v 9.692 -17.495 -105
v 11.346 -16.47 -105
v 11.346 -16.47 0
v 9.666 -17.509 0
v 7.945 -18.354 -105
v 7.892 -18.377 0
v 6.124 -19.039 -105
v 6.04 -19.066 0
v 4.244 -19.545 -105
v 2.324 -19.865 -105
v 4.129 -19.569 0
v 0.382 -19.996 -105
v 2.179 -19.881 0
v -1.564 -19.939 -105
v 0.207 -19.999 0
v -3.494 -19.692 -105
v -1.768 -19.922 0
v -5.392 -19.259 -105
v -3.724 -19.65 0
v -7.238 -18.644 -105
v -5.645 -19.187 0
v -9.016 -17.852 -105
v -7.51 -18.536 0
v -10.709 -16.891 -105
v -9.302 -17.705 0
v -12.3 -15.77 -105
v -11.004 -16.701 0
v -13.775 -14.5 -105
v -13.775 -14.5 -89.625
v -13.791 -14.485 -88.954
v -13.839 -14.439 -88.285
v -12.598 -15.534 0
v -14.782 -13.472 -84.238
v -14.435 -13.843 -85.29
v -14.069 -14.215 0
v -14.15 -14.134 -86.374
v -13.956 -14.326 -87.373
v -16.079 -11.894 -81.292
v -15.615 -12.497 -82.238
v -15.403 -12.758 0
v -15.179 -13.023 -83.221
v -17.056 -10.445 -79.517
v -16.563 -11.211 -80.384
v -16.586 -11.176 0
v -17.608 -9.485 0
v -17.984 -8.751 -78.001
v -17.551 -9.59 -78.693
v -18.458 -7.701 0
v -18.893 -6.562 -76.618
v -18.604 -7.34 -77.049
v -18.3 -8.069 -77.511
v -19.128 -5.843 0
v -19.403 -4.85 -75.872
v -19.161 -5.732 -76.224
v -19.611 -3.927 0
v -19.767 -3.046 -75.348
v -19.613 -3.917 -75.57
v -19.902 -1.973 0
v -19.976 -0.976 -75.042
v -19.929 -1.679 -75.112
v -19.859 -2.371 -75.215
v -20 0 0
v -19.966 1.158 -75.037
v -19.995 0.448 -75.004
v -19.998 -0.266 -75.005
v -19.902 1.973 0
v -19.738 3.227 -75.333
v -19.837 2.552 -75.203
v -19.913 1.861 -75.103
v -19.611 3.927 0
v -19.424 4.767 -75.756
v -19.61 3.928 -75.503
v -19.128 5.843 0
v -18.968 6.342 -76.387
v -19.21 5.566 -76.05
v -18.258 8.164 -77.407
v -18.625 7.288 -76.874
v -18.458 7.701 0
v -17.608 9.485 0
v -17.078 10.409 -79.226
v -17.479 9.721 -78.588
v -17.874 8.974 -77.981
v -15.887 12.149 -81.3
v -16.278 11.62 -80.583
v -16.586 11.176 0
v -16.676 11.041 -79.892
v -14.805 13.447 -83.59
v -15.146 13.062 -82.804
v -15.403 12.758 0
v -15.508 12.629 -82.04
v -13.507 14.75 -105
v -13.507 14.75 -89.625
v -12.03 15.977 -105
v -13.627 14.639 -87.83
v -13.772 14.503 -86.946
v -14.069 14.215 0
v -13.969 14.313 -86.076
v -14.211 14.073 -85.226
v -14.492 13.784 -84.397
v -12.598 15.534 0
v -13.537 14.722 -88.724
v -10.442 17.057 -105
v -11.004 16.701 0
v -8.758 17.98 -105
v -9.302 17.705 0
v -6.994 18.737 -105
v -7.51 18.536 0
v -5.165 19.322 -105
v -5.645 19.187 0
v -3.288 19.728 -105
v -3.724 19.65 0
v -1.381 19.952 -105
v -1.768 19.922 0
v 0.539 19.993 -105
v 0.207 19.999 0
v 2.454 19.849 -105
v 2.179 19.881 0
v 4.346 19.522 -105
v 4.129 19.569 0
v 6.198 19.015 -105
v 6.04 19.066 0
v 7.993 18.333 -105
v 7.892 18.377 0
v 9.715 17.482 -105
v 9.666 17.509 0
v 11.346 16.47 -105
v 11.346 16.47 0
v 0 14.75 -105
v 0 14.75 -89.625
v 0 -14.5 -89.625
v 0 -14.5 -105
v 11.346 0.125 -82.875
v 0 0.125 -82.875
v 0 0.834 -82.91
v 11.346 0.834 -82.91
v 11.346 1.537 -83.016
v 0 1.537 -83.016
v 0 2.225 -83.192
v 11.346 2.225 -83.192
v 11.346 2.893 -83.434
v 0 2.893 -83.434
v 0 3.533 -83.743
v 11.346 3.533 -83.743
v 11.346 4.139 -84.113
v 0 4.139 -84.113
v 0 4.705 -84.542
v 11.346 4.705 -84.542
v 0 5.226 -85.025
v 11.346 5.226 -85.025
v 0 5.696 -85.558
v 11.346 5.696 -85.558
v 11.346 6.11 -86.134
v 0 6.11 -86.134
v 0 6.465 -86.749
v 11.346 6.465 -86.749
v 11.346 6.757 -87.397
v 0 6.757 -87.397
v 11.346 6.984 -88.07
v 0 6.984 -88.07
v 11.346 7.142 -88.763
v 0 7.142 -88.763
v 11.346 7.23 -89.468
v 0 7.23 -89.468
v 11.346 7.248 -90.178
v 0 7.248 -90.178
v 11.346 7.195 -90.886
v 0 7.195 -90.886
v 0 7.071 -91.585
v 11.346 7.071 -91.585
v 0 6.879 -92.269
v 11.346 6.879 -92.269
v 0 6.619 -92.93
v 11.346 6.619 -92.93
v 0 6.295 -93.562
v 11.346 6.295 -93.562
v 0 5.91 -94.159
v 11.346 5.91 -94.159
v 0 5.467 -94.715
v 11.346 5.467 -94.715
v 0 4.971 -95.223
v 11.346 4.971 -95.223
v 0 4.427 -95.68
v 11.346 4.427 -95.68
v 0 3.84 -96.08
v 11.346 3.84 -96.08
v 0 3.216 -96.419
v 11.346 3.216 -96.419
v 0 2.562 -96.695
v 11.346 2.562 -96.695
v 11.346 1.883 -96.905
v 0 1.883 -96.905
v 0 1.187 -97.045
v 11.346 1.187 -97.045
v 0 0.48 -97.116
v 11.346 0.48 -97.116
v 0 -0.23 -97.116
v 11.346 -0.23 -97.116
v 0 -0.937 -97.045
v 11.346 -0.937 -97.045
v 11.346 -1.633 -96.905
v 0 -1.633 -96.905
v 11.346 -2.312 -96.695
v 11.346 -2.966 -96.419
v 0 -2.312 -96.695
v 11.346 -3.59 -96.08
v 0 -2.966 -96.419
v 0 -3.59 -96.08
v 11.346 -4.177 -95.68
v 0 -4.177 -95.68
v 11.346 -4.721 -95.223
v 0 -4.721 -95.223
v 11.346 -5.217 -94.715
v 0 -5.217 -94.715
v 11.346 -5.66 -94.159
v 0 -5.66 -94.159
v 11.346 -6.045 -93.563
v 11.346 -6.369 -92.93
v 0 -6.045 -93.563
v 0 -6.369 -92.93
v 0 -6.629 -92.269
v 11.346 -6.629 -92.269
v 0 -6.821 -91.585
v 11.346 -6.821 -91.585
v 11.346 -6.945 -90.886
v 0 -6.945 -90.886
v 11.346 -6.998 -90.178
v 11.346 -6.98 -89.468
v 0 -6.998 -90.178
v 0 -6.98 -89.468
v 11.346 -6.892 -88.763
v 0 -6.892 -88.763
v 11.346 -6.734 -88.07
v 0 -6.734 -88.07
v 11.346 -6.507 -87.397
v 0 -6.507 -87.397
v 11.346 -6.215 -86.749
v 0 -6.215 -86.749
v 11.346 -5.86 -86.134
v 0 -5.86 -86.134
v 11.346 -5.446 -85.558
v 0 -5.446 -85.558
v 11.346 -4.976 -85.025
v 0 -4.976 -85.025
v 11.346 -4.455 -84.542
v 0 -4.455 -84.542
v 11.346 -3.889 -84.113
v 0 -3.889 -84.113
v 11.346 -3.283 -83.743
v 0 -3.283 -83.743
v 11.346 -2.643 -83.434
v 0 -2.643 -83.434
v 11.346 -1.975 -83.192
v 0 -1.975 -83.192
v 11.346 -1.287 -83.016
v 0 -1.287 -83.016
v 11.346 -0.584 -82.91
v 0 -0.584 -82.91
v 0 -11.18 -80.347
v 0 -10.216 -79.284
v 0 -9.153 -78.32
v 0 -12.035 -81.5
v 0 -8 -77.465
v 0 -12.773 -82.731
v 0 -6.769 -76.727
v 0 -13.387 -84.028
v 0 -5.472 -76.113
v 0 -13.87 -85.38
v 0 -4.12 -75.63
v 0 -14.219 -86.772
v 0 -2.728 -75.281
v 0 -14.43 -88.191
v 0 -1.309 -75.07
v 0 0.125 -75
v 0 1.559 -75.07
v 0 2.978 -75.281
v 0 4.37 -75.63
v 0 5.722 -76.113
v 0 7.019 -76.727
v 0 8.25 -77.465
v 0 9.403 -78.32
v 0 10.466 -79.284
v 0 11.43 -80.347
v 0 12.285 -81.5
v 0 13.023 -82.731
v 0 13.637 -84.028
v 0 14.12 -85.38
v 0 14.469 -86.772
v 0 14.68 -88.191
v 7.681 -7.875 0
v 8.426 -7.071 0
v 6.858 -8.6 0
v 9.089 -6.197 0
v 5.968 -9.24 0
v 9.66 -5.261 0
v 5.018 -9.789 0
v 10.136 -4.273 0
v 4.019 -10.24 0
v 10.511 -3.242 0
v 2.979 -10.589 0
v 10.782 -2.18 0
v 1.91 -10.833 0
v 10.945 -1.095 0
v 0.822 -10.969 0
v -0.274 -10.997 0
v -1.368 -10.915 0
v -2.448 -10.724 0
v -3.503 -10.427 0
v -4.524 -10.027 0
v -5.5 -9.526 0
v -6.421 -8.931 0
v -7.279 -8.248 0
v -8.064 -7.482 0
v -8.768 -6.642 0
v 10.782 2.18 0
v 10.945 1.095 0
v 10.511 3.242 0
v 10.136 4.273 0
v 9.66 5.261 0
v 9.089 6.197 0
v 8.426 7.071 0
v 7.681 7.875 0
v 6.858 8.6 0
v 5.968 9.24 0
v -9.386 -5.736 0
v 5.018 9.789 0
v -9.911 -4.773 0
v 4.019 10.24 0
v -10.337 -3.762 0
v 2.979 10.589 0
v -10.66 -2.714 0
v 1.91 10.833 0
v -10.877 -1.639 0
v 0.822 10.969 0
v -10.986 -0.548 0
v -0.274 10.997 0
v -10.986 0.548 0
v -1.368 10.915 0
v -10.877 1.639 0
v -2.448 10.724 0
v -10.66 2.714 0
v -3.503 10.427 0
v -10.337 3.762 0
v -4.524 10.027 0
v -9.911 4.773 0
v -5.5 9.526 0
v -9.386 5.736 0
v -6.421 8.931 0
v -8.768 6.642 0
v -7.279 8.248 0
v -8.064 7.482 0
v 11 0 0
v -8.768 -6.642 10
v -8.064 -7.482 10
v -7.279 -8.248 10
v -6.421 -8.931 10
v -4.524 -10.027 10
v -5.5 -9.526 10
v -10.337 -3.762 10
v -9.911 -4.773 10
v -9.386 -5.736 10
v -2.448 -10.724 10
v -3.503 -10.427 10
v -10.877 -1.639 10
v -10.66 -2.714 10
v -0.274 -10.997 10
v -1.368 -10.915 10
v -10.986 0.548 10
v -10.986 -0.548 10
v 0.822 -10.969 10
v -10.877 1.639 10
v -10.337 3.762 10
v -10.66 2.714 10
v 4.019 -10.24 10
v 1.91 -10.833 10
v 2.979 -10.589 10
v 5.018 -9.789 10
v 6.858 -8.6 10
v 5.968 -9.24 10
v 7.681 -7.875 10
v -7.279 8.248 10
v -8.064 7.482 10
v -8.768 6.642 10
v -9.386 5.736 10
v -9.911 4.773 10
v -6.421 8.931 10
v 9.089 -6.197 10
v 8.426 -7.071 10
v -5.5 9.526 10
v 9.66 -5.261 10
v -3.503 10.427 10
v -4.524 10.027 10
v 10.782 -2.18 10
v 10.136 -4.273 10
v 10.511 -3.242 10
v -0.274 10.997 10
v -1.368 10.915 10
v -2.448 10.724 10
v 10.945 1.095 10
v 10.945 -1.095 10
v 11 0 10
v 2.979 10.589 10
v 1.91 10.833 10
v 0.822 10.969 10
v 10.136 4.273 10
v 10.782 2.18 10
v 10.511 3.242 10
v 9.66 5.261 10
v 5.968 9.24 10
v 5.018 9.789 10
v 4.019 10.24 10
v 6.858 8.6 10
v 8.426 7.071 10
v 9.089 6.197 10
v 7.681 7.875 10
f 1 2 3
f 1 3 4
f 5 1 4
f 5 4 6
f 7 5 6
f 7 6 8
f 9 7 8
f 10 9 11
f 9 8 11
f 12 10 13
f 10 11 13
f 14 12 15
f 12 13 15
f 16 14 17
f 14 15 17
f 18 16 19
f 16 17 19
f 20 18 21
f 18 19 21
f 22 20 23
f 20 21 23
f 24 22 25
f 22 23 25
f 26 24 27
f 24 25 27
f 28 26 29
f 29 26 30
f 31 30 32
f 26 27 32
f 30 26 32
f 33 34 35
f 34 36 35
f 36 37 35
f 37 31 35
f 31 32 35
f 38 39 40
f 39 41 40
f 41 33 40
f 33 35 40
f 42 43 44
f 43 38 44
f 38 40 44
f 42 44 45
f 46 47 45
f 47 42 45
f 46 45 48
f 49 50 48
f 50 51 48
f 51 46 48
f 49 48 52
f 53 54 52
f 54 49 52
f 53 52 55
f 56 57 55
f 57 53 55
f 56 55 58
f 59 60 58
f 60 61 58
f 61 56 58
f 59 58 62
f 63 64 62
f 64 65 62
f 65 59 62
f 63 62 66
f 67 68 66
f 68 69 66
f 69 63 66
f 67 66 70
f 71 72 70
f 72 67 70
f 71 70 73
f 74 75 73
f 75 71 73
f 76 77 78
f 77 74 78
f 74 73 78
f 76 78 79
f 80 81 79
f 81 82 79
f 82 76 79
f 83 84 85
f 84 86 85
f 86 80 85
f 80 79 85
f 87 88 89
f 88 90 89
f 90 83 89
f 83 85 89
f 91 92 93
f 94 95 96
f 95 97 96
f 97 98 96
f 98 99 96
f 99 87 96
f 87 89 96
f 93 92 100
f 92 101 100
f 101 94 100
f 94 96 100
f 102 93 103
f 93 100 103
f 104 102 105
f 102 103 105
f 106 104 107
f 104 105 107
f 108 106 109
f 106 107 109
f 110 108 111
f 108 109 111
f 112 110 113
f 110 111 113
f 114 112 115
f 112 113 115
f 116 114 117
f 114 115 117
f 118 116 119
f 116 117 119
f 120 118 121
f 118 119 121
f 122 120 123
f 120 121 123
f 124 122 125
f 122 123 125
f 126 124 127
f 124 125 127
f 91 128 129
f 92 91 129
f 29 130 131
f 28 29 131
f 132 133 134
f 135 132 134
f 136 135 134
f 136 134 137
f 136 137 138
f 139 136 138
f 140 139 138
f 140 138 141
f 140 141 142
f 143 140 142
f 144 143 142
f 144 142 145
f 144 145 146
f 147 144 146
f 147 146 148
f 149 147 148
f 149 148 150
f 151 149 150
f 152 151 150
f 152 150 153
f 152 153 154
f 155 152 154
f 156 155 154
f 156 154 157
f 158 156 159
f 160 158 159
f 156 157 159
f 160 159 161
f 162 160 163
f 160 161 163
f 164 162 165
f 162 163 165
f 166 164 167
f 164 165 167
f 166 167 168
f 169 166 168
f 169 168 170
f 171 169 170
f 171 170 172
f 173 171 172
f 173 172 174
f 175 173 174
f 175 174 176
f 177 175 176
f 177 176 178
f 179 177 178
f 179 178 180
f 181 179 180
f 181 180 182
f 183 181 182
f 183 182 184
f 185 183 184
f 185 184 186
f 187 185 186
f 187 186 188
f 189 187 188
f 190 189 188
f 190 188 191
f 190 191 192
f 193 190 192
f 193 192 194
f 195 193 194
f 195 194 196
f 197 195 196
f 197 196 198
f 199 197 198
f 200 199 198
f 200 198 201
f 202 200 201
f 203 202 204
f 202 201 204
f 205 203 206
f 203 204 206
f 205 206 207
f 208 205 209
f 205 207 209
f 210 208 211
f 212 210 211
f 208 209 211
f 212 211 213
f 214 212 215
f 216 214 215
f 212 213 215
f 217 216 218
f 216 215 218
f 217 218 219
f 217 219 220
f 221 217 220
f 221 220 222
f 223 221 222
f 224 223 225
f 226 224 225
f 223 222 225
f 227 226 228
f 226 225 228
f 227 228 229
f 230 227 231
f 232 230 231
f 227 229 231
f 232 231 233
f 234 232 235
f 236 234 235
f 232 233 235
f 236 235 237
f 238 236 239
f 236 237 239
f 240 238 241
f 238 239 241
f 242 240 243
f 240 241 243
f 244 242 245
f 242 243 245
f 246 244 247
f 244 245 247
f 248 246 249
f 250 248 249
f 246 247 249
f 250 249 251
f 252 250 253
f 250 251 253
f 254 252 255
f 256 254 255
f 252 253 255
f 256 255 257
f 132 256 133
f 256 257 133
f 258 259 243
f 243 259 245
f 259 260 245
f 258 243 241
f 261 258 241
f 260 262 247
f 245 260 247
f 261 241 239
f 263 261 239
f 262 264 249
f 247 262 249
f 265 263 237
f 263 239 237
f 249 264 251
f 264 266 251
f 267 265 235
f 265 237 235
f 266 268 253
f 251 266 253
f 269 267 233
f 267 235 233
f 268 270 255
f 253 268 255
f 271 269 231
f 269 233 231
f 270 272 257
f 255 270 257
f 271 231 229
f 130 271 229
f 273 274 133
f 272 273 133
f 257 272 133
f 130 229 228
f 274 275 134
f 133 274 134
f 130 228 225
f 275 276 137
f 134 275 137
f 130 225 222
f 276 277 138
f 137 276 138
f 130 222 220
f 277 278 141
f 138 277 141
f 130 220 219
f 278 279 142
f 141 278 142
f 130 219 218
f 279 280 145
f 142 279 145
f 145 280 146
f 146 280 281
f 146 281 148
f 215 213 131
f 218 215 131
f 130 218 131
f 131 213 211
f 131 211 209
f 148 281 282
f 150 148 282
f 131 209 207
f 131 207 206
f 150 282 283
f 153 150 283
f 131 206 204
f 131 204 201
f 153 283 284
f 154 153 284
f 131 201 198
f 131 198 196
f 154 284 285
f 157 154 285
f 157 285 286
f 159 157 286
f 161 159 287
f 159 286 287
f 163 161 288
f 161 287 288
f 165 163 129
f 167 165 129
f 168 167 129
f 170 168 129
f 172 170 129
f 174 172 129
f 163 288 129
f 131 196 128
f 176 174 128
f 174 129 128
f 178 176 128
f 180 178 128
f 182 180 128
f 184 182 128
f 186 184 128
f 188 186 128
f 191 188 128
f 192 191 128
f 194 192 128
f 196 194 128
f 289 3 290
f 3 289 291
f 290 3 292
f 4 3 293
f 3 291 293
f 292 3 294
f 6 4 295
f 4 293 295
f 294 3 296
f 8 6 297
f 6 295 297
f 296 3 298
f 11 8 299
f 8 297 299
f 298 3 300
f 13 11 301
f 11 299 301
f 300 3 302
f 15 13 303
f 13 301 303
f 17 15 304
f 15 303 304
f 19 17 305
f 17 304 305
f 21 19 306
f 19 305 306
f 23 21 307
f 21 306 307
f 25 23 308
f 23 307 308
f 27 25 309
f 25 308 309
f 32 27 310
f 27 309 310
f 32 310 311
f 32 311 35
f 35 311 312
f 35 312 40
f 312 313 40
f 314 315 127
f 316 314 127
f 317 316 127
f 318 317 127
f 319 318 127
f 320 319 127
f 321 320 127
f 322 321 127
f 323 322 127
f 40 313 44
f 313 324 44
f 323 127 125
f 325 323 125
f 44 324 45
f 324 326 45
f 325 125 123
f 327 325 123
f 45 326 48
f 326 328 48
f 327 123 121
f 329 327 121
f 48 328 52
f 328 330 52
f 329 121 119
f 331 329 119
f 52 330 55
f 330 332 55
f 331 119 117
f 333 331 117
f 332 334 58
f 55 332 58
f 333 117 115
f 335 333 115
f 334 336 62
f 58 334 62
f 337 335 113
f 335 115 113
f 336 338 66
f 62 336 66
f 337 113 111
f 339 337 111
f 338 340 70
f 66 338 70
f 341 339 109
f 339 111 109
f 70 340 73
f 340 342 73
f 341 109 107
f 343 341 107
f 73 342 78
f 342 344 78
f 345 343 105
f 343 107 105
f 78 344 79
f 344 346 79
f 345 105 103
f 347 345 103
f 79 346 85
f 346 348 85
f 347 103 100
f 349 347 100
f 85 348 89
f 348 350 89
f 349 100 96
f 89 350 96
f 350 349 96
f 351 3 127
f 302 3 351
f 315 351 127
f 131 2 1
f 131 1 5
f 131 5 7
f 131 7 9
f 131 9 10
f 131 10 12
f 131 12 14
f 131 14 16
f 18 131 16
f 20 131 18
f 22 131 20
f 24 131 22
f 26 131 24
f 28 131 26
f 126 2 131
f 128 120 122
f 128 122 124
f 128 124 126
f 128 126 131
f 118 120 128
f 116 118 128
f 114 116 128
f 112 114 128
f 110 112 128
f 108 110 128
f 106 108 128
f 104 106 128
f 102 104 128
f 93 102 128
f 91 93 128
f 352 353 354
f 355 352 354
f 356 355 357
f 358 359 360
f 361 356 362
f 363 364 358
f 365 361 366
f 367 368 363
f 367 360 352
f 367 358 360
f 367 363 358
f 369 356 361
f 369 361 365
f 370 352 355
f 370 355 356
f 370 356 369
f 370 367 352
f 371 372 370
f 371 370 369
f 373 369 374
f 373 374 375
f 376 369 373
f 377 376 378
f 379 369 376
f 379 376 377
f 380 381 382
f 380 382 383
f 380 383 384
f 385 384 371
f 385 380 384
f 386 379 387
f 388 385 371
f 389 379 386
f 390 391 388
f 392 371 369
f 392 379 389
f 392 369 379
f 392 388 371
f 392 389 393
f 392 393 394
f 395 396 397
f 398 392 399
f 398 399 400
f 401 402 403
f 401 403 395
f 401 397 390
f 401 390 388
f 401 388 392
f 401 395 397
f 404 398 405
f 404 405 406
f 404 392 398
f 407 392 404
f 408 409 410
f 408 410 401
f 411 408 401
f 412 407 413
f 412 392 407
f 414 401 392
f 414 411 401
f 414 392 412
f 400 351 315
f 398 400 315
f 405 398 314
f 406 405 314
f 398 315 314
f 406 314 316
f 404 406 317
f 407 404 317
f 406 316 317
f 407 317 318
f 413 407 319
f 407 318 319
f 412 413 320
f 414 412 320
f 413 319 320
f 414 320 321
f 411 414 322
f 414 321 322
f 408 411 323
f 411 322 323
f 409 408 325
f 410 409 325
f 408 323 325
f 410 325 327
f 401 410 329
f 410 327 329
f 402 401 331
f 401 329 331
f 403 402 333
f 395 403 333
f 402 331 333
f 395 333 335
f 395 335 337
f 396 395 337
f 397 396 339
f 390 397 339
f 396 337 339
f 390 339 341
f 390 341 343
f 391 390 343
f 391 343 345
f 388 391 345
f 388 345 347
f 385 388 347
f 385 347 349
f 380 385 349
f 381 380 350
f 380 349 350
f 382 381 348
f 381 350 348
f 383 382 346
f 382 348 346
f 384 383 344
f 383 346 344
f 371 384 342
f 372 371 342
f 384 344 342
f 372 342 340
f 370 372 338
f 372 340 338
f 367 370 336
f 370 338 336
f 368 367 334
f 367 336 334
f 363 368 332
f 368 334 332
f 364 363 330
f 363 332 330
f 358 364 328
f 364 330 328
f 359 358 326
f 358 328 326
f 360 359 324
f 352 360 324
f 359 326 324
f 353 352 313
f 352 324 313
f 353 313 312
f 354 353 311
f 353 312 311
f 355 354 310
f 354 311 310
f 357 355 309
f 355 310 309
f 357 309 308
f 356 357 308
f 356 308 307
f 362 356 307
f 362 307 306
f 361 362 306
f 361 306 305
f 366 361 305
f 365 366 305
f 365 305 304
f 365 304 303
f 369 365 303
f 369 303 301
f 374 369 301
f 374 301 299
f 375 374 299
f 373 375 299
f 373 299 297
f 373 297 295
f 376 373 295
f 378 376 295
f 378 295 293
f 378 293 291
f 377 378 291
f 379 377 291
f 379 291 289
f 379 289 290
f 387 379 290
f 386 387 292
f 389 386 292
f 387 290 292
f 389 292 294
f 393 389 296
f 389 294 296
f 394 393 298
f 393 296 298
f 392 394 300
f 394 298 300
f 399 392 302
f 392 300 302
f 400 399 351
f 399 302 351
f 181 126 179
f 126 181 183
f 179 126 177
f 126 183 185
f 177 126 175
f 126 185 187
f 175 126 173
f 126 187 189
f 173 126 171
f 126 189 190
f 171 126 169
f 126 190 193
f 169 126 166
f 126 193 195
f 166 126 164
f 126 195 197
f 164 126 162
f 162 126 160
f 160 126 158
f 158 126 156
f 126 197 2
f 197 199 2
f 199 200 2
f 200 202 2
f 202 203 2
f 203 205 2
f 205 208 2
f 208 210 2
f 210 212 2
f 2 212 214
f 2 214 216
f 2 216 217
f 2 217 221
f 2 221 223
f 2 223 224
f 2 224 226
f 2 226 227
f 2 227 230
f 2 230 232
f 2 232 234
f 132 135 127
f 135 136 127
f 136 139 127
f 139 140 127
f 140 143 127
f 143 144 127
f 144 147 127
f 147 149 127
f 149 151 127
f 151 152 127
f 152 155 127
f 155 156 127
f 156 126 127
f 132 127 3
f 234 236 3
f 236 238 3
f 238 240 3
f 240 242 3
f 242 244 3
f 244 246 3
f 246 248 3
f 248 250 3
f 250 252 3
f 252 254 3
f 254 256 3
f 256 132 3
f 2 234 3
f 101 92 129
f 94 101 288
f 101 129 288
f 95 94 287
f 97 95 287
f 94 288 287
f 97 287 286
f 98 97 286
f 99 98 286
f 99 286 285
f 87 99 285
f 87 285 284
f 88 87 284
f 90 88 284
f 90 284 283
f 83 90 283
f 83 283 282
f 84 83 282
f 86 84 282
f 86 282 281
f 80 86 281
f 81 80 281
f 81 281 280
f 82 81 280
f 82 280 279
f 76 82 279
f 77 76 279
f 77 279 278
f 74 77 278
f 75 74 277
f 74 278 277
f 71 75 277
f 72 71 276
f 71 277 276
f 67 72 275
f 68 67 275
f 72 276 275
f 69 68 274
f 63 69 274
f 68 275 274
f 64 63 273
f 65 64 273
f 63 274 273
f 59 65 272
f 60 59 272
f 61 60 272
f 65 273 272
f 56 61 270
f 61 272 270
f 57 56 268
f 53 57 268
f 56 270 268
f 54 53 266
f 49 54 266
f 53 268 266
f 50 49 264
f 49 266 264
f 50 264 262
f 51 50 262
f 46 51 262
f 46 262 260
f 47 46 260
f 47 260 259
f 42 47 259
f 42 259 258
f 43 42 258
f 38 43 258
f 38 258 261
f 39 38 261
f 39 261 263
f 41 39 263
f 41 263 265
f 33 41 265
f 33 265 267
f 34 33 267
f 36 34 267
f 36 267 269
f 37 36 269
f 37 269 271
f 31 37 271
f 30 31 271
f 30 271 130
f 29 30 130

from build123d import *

# Parameters (mm, degrees)
SKETCH1_R           = 11
BOSS_EXTRUDE1_DEPTH = 10
SKETCH2_R           = 20
BOSS_EXTRUDE2_DEPTH = 105
CUT_EXTRUDE1_DEPTH  = 109.742815855
SKETCH5_R           = 7.125
CUT_EXTRUDE2_DEPTH  = 109.742815988
CUT_EXTRUDE3_START  = -105
CUT_EXTRUDE3_DEPTH  = 105


with BuildPart() as part:
    # Sketch1 → Boss-Extrude1 (new body)
    with BuildSketch(Plane.XY):
        Circle(SKETCH1_R)
    extrude(amount=BOSS_EXTRUDE1_DEPTH)

    # Sketch2 → Boss-Extrude2 (add)
    with BuildSketch(Plane(origin=(0, 0, 0), x_dir=(-1, 0, 0), z_dir=(0, 0, -1))):
        Circle(SKETCH2_R)
    extrude(amount=BOSS_EXTRUDE2_DEPTH)

    # Sketch3 → Cut-Extrude1 (cut, through all)
    with BuildSketch(Plane(origin=(0, 0, 0), x_dir=(0, 0, -1), z_dir=(1, 0, 0))):
        with BuildLine():
            Line((139.625, 14.75), (89.625, 14.75))
            ThreePointArc((89.625, 14.75), (75, 0.125), (89.625, -14.5))
            Line((89.625, -14.5), (139.625, -14.5))
            Line((139.625, -14.5), (139.625, 14.75))
        make_face()
    extrude(amount=-CUT_EXTRUDE1_DEPTH, mode=Mode.SUBTRACT)

    # Sketch5 → Cut-Extrude2 (cut, through all)
    with BuildSketch(Plane.ZY):
        with Locations((-90, 0.125)):
            Circle(SKETCH5_R)
    extrude(amount=-CUT_EXTRUDE2_DEPTH, mode=Mode.SUBTRACT)

    # Sketch6 → Cut-Extrude3 (cut)
    with BuildSketch(Plane(origin=(0, 0, -105), x_dir=(-1, 0, 0), z_dir=(0, 0, -1)).offset(CUT_EXTRUDE3_START)):
        with BuildLine():
            Line((-11.346386998, 16.469957562), (-11.346386998, -16.469957562))
            ThreePointArc((-11.346386998, -16.469957562), (-20, 0), (-11.346386998, 16.469957562))
        make_face()
    extrude(amount=CUT_EXTRUDE3_DEPTH, mode=Mode.SUBTRACT)


solid = part.part
